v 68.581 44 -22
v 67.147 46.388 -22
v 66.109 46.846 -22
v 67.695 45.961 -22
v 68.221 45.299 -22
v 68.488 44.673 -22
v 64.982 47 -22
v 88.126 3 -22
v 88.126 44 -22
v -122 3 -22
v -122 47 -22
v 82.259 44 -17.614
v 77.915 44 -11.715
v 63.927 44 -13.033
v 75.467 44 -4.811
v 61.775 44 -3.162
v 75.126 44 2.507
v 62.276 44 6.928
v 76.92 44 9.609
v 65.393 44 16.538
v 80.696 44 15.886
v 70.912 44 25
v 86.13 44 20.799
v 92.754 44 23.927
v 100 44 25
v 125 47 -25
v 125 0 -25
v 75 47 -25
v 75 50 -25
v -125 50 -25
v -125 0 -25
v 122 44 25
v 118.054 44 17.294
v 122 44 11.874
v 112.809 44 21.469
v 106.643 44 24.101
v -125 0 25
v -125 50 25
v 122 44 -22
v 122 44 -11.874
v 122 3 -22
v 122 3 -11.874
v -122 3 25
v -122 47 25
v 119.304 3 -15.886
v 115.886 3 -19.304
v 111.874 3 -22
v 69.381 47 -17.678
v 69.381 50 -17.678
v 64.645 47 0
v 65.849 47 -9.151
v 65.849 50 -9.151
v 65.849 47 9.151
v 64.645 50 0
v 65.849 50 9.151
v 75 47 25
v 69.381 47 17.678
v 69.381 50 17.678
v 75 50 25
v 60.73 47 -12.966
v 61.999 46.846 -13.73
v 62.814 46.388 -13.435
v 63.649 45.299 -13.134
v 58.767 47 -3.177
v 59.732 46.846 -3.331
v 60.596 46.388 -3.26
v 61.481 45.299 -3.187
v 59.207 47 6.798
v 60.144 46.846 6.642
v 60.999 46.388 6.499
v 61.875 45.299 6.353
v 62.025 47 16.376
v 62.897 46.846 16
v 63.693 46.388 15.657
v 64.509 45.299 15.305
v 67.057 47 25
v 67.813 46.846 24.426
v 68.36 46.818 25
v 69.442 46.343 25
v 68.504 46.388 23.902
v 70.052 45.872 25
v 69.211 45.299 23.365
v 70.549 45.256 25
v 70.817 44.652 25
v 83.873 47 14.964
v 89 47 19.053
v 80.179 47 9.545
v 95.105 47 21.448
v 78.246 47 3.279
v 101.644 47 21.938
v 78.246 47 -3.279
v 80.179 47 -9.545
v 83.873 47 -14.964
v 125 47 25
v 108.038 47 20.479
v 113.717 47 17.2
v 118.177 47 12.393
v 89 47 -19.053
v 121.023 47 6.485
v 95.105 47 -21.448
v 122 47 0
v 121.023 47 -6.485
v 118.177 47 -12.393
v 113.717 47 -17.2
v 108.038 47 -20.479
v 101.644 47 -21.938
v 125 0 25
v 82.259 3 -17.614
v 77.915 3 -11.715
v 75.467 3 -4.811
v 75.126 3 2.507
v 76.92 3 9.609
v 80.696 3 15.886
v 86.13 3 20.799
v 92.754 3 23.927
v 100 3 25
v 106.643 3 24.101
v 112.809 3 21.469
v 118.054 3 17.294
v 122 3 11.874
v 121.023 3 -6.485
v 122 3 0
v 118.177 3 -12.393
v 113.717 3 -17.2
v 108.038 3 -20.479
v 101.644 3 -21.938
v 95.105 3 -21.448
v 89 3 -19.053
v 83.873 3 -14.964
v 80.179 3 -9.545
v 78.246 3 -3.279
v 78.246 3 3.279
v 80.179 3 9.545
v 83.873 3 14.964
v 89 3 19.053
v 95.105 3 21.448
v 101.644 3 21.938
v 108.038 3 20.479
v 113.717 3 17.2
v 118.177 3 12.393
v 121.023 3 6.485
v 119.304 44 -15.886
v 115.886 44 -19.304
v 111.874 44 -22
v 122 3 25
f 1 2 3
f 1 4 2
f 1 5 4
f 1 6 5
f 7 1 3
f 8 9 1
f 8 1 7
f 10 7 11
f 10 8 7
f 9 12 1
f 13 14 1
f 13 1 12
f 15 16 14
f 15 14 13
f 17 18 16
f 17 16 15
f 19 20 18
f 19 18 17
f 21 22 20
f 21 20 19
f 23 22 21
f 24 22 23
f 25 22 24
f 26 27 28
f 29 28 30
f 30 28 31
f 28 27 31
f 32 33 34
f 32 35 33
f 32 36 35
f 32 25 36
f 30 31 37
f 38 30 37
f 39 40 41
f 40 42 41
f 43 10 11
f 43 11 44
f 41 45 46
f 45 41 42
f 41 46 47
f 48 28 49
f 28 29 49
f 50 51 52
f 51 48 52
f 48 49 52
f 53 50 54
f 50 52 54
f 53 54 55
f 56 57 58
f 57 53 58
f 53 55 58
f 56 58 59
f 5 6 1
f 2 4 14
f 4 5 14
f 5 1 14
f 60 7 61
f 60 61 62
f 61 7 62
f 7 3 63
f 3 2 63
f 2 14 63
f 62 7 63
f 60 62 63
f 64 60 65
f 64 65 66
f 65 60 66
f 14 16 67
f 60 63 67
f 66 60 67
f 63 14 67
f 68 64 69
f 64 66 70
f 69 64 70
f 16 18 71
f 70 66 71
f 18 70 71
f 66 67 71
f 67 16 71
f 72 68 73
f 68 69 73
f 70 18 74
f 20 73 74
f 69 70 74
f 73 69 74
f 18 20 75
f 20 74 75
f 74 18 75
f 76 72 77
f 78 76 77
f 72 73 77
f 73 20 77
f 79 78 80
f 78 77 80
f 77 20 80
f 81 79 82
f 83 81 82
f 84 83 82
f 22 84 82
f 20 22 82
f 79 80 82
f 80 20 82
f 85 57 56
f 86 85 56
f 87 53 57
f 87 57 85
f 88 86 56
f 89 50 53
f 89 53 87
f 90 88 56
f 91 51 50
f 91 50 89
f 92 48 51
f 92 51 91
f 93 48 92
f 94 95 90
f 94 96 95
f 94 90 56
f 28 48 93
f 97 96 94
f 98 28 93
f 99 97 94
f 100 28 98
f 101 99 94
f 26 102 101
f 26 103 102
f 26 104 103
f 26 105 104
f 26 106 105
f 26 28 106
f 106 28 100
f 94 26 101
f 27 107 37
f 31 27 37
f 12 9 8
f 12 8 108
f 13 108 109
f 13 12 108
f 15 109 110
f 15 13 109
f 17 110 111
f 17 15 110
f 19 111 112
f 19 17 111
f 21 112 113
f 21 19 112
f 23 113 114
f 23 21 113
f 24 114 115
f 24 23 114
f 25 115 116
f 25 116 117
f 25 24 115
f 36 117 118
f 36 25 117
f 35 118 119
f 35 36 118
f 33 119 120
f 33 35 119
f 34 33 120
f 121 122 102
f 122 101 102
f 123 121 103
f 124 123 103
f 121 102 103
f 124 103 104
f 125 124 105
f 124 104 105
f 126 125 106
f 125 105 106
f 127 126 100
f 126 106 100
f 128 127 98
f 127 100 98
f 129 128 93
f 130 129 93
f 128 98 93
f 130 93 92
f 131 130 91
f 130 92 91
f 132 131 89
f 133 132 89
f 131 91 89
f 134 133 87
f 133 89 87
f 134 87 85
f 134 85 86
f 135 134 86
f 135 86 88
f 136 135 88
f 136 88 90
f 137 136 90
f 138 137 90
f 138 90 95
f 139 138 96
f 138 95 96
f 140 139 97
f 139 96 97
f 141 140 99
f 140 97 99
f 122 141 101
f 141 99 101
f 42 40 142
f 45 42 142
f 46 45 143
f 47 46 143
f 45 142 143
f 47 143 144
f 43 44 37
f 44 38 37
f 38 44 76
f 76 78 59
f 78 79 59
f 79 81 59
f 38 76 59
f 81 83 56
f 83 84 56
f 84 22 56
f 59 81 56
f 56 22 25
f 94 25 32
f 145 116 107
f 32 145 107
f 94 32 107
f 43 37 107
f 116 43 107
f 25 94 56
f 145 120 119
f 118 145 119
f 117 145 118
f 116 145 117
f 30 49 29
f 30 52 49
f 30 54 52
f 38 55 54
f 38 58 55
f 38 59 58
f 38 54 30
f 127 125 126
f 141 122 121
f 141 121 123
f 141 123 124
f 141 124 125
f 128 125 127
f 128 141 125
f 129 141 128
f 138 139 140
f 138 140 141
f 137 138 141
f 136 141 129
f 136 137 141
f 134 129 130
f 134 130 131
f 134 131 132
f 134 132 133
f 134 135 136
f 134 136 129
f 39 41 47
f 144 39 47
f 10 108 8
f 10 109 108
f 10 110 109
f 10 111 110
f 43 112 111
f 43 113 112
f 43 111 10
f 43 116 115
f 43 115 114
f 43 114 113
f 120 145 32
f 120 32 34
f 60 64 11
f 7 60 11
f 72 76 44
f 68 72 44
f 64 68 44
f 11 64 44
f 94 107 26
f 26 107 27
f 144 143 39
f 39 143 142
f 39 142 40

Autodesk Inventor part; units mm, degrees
ref_plane "YZ Plane" through (0, 0, 0) normal (1, 0, 0) x (0, 1, 0)
ref_plane "XZ Plane" through (0, 0, 0) normal (0, 1, 0) x (-1, 0, 0)
ref_plane "XY Plane" through (0, 0, 0) normal (0, 0, 1) x (1, 0, 0)
sketch "草圖1" plane through (0, 0, 0) normal (0, 1, 0) x (-1, 0, 0)
  line L0 (125, 25) -> (-125, 25)
  line L1 (-125, 25) -> (-125, -25)
  line L2 (-125, -25) -> (125, -25)
  line L3 (125, -25) -> (125, 25)
  line L4 (125, 25) -> (-125, -25) construction
  line L5 (-125, 25) -> (125, -25) construction
  point P0 (0, 0)
  dimension "d0" = 250
  dimension "d1" = 50
extrude "擠出1" add sketch "草圖1" along normal blind 50
shell "薄殼1" thickness 3 removed faces 1 at (-41.6667, 16.6667, 25)
sketch "草圖2" plane through (0, 50, 0) normal (0, 1, 0) x (1, 0, 0)
  line L0 (125, -25) -> (125, 25) construction
  line L1 (125, 25) -> (-125, 25) construction
  line L2 (-125, 25) -> (-125, -25) construction
  line L3 (-125, -25) -> (125, -25) construction
  circle A0 centre (100, 0) radius 25
  circle A1 centre (100, 0) radius 22
  point P0 (0, 0)
  point P1 (125, 0)
  dimension "d5" = 3
extrude "擠出2" add sketch "草圖2" against normal up to surface (50 mm away)
sketch "草圖4" plane through (0, 50, 0) normal (0, 1, 0) x (1, 0, 0)
  point P0 (0, 0)
sketch "草圖5" plane through (0, 50, 0) normal (0, 1, 0) x (1, 0, 0)
  line L0 (125, 25) -> (-125, 25) construction
  line L1 (-125, 25) -> (-125, -25) construction
  line L2 (-125, -25) -> (125, -25) construction
  line L3 (125, -25) -> (125, 25) construction
  line L4 (125, 0) -> (100, 0) construction
  line L5 (100, 0) -> (100, 25) construction
  line L6 (125, 25) -> (-125, 25) construction
  circle A0 centre (100, 0) radius 35.3553
  point P0 (0, 0)
extrude "擠出4" cut sketch "草圖5" against normal blind 3
sketch "草圖6" plane through (-122, 47, -22) normal (0, -1, 0) x (1, 0, 0)
  line L0 (210.1257, 0) -> (194.3233, 0) projected
  arc A0 (244, 33.8743) -> (210.1257, 0) centre (222, 22) ccw projected
  line L1 (244, 47) -> (244, 33.8743) projected
  line L2 (247, 47) -> (244, 47) projected
  line L3 (247, -3) -> (247, 47) projected
  line L4 (197, -3) -> (247, -3) projected
  arc A1 (194.3233, 0) -> (197, -3) centre (222, 22) ccw projected
  circle A2 centre (222, 22) radius 22 projected
  arc A3 (233.8743, 0) -> (244, 10.1257) centre (222, 22) ccw projected
  line L5 (244, 0) -> (233.8743, 0) projected
  line L6 (244, 10.1257) -> (244, 0) projected
  arc A4 (197, 47) -> (197, -3) centre (222, 22) ccw projected
  line L7 (197, -3) -> (-3, -3) projected
  line L8 (-3, -3) -> (-3, 47) projected
  line L9 (-3, 47) -> (197, 47) projected
  line L10 (197, 47) -> (244, 47)
  arc A5 (222, 47) -> (210.1257, 0) centre (222, 22) ccw projected
  circle A6 centre (222, 22) radius 38.3553
  point P0 (122, 22)
  point P1 (222, 47)
  point P2 (192.9117, 47)
  point P3 (192.9117, -3)
  point P4 (197, -3)
  dimension "d14" = 3
extrude "擠出5" add sketch "草圖6" along normal blind 3 contours L0 A4 L10 A0 | A1 L7 A6 L9 A4 | L10 L1 A0 | A3 L6 L5
fillet "圓角1" radius 3 1 edges at (61.6917, 47, 1.8994)
properties part number "Base_box"
